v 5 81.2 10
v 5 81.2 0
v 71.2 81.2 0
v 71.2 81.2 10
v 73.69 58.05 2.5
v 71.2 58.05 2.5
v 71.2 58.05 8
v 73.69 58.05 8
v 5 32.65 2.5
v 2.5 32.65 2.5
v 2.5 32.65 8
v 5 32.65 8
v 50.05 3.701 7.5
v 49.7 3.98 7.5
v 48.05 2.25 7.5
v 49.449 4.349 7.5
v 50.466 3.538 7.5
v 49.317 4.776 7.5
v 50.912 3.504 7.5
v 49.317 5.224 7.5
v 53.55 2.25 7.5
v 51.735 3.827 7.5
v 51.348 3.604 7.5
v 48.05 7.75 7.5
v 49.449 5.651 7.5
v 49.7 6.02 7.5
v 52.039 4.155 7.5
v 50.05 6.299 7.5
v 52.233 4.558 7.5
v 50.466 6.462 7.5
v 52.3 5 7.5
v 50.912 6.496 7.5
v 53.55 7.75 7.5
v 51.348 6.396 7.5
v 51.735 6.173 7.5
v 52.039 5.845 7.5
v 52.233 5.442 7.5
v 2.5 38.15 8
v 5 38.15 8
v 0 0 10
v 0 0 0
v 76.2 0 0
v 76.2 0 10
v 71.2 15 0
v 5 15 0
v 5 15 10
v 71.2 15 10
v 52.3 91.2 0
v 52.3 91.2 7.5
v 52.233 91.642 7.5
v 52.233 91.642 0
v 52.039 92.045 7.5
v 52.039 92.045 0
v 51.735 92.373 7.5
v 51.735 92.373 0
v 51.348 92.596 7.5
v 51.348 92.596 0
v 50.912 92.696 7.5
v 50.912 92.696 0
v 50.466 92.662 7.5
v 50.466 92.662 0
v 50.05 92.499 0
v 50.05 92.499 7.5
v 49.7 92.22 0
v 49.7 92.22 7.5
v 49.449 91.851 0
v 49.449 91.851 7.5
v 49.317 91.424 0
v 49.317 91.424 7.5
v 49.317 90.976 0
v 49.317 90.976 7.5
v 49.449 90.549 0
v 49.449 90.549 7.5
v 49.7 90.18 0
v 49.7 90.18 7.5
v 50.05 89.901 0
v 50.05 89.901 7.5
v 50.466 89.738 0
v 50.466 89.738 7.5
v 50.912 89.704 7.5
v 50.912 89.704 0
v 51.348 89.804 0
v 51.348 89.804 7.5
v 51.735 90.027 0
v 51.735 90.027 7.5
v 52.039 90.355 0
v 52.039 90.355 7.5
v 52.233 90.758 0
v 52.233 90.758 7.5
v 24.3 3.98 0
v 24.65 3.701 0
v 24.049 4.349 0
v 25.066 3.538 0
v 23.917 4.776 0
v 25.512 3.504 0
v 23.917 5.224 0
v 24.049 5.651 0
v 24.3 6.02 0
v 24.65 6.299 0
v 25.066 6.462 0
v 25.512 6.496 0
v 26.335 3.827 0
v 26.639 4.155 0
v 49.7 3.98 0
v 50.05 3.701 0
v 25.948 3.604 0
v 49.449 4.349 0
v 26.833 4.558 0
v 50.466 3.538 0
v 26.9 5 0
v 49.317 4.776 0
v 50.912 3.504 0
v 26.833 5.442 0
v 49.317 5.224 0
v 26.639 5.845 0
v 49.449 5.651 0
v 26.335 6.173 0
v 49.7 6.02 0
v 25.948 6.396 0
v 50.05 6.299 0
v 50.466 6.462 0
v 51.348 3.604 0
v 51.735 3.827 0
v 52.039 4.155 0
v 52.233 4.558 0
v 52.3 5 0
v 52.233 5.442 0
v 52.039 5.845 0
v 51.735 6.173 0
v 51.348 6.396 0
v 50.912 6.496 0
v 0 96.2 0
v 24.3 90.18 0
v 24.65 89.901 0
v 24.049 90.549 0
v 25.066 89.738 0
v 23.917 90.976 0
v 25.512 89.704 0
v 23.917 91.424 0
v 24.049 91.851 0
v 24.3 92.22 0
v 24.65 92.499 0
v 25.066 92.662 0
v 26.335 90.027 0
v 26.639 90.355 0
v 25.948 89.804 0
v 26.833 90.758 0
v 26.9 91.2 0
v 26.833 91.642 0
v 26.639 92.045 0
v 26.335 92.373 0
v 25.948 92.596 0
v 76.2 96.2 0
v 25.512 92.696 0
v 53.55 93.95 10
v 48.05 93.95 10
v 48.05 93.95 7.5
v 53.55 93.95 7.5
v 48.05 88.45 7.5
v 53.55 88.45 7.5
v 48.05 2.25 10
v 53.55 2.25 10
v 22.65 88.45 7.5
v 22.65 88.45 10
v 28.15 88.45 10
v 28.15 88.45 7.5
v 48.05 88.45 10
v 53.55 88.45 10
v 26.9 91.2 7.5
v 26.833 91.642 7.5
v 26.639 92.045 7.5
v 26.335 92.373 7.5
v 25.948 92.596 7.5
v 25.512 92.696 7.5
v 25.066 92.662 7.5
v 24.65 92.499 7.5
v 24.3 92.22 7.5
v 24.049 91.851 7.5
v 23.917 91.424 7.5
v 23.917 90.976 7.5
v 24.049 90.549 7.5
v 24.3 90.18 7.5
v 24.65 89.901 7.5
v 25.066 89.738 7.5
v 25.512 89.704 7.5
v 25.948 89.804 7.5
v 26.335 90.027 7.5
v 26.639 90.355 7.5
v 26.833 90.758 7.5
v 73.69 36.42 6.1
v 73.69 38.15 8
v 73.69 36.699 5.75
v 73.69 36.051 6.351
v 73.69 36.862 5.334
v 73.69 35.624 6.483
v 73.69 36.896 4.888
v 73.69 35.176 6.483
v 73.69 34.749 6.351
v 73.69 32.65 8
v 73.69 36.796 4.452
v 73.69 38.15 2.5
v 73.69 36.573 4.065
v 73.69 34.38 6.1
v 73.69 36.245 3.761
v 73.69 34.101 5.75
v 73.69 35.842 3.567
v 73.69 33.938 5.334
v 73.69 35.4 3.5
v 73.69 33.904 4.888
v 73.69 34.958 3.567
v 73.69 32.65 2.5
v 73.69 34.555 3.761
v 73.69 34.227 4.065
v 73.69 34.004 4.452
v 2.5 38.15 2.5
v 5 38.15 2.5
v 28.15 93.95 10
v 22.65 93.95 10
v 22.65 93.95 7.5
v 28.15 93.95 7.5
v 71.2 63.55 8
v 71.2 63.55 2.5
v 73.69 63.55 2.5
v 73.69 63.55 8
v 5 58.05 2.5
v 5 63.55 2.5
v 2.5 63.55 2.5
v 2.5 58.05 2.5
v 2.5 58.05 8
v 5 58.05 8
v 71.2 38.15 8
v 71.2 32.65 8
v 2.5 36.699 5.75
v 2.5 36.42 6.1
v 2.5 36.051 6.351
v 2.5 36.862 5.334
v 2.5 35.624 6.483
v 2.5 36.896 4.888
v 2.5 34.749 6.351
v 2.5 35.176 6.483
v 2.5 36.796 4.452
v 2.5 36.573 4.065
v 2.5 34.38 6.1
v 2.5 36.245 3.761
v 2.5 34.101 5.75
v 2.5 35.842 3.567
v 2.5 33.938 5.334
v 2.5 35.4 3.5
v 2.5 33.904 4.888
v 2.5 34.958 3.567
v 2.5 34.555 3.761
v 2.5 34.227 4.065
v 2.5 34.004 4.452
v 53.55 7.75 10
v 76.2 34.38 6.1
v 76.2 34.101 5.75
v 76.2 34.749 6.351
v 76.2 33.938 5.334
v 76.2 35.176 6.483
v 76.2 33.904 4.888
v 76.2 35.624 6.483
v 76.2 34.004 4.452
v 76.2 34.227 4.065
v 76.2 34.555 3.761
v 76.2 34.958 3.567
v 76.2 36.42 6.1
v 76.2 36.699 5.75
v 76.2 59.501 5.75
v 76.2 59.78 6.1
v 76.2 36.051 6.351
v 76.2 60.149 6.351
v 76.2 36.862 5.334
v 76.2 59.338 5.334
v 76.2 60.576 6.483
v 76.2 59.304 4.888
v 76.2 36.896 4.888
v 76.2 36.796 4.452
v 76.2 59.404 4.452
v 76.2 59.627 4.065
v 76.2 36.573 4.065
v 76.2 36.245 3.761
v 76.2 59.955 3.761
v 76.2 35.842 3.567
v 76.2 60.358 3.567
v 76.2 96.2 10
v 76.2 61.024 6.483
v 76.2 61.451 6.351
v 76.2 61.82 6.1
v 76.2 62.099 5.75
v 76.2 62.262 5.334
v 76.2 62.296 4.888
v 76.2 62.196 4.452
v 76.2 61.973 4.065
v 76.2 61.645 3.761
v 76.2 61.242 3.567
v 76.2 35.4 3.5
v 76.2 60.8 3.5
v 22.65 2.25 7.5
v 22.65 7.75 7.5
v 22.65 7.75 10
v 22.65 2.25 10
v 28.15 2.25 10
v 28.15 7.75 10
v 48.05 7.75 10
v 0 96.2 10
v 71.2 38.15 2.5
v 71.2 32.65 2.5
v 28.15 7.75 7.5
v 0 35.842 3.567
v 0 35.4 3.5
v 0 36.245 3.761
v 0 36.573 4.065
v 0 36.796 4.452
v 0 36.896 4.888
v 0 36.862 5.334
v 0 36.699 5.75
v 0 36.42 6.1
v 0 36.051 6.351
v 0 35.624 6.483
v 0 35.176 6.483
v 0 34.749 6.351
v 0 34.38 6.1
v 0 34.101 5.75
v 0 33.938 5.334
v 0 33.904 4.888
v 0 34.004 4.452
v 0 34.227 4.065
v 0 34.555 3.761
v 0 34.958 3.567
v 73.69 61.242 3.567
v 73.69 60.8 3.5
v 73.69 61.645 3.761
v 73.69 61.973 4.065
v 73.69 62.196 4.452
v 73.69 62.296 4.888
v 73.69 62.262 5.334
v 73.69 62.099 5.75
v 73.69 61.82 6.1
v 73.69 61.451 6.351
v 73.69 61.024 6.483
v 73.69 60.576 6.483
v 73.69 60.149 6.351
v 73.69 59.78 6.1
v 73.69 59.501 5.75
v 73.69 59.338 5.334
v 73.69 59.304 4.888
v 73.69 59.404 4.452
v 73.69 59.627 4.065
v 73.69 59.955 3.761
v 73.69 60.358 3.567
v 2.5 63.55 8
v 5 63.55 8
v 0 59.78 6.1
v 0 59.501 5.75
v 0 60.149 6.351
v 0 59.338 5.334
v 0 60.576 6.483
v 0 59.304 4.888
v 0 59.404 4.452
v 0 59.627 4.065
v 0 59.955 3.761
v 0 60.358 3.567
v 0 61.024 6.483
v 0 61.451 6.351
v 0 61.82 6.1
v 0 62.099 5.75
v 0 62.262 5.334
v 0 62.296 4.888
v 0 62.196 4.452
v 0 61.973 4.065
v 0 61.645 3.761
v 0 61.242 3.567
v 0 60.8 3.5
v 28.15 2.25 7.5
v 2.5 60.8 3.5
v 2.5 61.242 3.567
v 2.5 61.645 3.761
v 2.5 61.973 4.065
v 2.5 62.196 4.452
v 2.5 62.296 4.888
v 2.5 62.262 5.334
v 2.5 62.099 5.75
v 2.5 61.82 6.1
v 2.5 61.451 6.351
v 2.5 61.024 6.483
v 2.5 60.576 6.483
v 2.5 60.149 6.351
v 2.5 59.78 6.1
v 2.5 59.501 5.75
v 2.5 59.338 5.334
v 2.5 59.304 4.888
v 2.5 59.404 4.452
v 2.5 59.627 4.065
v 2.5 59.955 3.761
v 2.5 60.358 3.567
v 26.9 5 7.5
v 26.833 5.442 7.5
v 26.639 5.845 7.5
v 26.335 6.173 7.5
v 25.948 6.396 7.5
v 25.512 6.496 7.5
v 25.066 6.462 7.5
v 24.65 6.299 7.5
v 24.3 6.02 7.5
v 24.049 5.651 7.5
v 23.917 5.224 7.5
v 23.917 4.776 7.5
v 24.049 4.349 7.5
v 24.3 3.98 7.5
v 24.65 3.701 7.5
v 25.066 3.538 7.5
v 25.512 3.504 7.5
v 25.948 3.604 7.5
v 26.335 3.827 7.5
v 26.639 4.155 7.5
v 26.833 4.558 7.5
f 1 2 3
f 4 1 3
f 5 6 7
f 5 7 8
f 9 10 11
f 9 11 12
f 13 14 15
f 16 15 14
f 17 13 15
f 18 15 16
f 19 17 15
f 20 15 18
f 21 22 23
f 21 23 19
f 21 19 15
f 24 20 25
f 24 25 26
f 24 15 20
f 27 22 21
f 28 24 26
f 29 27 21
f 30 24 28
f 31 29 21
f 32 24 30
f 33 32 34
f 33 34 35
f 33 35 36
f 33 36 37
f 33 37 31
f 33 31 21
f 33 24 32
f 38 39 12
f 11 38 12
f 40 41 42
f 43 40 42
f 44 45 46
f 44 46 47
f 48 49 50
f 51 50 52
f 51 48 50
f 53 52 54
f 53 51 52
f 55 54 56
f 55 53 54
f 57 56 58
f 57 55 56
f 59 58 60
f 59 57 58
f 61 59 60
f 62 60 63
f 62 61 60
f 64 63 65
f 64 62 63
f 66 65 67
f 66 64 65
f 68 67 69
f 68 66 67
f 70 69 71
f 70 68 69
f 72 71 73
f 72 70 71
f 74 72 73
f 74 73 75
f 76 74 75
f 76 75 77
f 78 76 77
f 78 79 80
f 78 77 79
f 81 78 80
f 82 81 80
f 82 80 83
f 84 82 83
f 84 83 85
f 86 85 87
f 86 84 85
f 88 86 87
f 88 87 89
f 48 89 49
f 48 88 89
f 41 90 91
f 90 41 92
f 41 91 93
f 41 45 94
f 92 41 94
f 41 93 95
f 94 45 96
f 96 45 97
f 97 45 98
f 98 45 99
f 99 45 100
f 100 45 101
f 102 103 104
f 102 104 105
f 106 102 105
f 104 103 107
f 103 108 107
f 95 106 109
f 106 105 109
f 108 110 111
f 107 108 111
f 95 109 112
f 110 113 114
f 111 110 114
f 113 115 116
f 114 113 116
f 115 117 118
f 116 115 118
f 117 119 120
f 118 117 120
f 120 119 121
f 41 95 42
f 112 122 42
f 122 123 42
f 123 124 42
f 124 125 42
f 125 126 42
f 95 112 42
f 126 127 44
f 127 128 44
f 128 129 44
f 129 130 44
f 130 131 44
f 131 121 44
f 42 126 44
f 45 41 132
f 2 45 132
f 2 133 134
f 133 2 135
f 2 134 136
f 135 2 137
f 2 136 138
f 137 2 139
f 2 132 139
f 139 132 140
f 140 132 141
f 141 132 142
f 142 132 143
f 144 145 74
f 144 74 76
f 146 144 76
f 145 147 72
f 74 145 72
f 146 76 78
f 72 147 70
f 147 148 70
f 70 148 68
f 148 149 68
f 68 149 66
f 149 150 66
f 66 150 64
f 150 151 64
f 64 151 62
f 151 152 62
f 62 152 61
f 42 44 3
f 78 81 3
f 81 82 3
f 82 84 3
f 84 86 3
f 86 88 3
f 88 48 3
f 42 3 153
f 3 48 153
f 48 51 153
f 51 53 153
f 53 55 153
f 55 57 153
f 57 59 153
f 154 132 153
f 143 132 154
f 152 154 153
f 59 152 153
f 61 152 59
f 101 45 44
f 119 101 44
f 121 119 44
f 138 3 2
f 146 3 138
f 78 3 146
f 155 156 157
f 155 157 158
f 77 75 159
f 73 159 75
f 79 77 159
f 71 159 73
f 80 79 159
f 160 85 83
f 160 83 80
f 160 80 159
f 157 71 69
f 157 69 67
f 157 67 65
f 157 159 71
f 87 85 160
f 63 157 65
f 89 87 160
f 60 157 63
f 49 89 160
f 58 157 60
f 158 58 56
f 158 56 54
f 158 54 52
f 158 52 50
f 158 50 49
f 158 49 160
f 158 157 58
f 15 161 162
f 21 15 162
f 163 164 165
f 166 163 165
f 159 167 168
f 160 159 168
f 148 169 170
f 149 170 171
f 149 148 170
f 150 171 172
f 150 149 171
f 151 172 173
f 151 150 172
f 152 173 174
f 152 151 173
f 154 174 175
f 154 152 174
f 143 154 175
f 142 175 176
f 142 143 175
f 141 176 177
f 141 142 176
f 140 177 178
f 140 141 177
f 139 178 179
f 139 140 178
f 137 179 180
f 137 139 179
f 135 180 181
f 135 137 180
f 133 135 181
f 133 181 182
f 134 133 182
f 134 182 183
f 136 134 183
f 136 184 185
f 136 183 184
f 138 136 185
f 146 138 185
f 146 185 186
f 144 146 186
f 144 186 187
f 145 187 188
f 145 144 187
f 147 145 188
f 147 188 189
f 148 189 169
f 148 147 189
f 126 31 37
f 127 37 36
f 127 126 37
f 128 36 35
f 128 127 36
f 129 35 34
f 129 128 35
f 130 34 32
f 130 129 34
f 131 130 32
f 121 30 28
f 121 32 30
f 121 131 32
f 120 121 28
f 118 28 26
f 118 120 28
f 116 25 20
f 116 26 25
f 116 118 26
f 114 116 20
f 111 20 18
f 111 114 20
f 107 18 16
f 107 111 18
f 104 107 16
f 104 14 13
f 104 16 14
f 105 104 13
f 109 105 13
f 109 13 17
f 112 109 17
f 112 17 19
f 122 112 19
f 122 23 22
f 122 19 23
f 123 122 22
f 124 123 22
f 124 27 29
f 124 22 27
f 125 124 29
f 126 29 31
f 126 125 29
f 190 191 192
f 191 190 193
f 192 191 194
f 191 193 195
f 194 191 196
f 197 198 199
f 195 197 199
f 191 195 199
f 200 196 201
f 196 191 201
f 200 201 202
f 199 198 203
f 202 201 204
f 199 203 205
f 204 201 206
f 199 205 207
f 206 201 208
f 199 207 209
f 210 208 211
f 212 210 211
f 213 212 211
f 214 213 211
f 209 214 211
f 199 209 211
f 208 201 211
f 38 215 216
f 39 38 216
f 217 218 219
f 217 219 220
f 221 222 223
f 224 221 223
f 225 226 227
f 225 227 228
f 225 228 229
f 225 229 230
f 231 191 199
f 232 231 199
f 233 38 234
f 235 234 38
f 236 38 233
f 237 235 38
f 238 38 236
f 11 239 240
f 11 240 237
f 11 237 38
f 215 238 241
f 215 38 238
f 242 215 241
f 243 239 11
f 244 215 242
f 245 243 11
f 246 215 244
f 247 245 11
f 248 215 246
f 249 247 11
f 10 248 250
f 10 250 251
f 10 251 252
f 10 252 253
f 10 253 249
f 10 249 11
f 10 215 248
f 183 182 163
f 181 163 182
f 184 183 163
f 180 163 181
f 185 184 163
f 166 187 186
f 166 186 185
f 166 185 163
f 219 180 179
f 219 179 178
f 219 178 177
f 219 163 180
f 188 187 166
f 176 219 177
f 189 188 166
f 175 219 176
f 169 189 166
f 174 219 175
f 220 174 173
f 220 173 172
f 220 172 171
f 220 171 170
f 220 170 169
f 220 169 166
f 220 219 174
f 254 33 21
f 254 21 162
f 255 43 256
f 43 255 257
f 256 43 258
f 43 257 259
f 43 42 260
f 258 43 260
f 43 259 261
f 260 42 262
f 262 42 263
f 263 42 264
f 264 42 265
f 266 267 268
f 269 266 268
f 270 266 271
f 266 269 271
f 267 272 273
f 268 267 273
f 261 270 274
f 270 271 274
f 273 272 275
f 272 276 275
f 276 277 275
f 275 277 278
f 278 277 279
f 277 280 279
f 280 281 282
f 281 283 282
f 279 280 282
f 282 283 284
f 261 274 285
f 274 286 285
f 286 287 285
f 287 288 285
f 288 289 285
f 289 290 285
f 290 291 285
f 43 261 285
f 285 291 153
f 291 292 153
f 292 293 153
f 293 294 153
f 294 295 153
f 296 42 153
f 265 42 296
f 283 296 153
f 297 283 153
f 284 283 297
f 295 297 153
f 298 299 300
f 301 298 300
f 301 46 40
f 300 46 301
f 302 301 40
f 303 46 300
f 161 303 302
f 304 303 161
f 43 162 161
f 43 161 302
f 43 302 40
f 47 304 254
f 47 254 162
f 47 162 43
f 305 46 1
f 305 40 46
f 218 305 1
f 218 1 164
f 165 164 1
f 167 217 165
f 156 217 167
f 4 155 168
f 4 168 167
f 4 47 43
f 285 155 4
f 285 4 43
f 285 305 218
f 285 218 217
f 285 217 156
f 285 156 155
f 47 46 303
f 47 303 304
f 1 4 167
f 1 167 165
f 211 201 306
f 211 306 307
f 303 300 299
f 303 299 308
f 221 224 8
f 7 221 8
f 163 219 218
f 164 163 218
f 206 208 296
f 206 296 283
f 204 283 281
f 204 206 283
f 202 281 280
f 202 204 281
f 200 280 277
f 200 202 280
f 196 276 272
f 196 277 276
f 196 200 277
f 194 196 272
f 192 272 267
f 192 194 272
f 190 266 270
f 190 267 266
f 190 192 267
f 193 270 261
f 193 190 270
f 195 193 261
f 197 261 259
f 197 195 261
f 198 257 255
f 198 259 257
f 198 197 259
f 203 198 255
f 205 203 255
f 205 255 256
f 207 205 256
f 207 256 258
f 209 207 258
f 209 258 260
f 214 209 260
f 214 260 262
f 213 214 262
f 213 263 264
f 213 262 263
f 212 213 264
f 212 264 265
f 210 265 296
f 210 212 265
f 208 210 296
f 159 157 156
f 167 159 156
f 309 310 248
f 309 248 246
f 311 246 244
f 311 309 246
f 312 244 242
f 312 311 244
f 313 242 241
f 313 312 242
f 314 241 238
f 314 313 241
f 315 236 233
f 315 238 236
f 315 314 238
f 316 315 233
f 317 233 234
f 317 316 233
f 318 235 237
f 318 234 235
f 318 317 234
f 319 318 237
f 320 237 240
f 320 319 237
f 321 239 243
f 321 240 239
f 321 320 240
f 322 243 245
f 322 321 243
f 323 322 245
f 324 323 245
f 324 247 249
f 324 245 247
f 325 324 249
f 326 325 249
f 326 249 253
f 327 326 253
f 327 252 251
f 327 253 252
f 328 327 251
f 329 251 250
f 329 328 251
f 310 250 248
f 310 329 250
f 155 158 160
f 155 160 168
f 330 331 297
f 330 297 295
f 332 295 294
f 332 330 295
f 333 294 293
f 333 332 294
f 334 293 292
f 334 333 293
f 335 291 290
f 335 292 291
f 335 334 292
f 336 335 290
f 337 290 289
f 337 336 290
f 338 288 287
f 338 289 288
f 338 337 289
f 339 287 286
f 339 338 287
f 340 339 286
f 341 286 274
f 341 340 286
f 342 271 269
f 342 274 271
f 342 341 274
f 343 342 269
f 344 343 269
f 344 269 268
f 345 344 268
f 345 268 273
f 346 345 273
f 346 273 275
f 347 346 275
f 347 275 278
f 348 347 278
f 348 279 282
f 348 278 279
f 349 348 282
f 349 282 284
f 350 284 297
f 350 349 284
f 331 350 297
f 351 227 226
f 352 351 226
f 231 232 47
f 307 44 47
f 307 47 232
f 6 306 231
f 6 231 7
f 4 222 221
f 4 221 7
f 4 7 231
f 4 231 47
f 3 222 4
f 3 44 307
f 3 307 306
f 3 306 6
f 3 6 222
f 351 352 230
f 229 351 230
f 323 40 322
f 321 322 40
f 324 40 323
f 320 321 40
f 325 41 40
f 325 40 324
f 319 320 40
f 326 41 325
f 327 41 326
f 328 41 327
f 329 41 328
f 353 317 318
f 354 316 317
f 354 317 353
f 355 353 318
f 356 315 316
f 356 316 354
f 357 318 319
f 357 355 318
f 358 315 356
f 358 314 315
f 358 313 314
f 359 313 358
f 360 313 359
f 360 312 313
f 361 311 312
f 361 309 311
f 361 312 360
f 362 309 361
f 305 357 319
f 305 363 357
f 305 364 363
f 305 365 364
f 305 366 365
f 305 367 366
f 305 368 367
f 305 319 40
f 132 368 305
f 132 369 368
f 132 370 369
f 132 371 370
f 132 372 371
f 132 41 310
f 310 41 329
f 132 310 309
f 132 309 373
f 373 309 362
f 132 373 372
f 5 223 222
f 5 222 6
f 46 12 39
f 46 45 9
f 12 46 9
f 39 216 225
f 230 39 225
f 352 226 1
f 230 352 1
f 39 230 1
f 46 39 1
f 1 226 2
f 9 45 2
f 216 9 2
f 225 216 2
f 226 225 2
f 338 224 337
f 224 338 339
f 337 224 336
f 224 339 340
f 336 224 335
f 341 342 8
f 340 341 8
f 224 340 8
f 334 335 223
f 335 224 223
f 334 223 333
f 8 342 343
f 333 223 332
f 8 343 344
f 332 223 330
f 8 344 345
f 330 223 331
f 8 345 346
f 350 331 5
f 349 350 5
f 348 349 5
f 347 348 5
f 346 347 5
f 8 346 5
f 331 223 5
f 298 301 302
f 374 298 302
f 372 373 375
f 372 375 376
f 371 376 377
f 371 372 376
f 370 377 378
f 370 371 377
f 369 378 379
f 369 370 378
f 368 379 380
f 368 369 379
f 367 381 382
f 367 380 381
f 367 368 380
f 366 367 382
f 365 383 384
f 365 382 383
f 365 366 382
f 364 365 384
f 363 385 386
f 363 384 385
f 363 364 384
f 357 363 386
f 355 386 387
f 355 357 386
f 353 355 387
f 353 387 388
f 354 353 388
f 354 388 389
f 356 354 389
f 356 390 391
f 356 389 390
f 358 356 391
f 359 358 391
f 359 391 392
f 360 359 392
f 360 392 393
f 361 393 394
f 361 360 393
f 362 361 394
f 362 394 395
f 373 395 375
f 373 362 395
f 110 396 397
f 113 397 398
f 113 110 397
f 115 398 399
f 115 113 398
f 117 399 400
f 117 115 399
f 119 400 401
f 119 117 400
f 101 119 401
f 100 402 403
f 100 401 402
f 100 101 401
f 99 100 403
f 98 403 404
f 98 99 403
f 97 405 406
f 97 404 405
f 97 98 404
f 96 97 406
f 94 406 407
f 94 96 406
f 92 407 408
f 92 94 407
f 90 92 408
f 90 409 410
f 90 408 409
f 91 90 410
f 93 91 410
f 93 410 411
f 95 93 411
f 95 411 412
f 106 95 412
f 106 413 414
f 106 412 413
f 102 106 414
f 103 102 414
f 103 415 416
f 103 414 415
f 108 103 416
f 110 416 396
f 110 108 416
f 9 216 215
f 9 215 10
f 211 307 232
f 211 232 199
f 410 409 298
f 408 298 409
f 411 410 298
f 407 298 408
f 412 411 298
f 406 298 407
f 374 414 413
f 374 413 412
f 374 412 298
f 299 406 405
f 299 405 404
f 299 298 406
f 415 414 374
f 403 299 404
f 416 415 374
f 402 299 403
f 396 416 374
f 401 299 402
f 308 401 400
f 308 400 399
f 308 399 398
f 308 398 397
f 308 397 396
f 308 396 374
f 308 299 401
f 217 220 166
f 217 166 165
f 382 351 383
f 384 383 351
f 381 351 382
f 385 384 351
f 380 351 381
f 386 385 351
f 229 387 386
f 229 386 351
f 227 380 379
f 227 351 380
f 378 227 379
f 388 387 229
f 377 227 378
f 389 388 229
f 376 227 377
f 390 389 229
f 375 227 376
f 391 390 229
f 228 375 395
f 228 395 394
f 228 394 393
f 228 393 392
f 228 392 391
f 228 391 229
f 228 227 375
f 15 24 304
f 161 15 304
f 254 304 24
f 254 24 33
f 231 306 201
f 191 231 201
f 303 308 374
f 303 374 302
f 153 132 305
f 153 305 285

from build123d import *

# Parameters (mm, degrees)
CYLINDER002001_R              = 1.5
CYLINDER002001_DEPTH          = 5
CYLINDER002001_PITCH_ANGLE    = 90
CYLINDER002002_R              = 1.5
CYLINDER002002_DEPTH          = 5
CYLINDER002002_PITCH_ANGLE    = 90
CYLINDER002001001_R           = 1.5
CYLINDER002001001_DEPTH       = 5
CYLINDER002001001_PITCH_ANGLE = 90
CYLINDER_R                    = 1.5
CYLINDER_DEPTH                = 10
CYLINDER002001002_R           = 1.5
CYLINDER002001002_DEPTH       = 10
CYLINDER002001003_R           = 1.5
CYLINDER002001003_DEPTH       = 10
CYLINDER002001002001_R        = 1.5
CYLINDER002001002001_DEPTH    = 10
CYLINDER002_R                 = 1.5
CYLINDER002_DEPTH             = 5
CYLINDER002_PITCH_ANGLE       = 90
BOX003_W                      = 5.5
BOX003_H                      = 2.5
BOX003_DEPTH                  = 5.5
BOX003_PLACEMENT_ANGLE        = -90
BOX004_W                      = 5.5
BOX004_H                      = 2.5
BOX004_DEPTH                  = 5.5
BOX004_PLACEMENT_ANGLE        = -90
BOX005_W                      = 5.5
BOX005_H                      = 2.5
BOX005_DEPTH                  = 5.5
BOX005_PLACEMENT_ANGLE        = -90
BOX006_W                      = 5.5
BOX006_H                      = 2.5
BOX006_DEPTH                  = 5.5
BOX006_ROLL_ANGLE             = 90
BOX007_W                      = 5.5
BOX007_H                      = 2.5
BOX007_DEPTH                  = 5.5
BOX007_ROLL_ANGLE             = 90
BOX006001_W                   = 5.5
BOX006001_H                   = 2.5
BOX006001_DEPTH               = 5.5
BOX006001_ROLL_ANGLE          = 90
BOX007001_W                   = 5.5
BOX007001_H                   = 2.5
BOX007001_DEPTH               = 5.5
BOX007001_ROLL_ANGLE          = 90
BOX002_W                      = 5.5
BOX002_H                      = 2.5
BOX002_DEPTH                  = 5.5
BOX002_PLACEMENT_ANGLE        = -90
BOX001_W                      = 66.199997
BOX001_H                      = 66.199997
BOX001_DEPTH                  = 10
BOX_W                         = 76.199997
BOX_H                         = 96.199997
BOX_DEPTH                     = 10


with BuildPart() as cylinder002001:
    # Cylinder002001 → Cylinder002001 (new body)
    with BuildSketch(Plane.XY):
        Circle(CYLINDER002001_R)
    extrude(amount=CYLINDER002001_DEPTH)


with BuildPart() as cylinder002001_1:
    # Cylinder002001 pitch: moved
    add(cylinder002001.part.rotate(Axis((0, 0, 0), (0, 1, 0)), CYLINDER002001_PITCH_ANGLE))


with BuildPart() as cylinder002001_2:
    # Cylinder002001 placement: moved
    add(cylinder002001_1.part.moved(Location((71.2, 35.4, 5))))


with BuildPart() as cylinder002002:
    # Cylinder002002 → Cylinder002002 (new body)
    with BuildSketch(Plane.XY):
        Circle(CYLINDER002002_R)
    extrude(amount=CYLINDER002002_DEPTH)


with BuildPart() as cylinder002002_1:
    # Cylinder002002 pitch: moved
    add(cylinder002002.part.rotate(Axis((0, 0, 0), (0, 1, 0)), CYLINDER002002_PITCH_ANGLE))


with BuildPart() as cylinder002002_2:
    # Cylinder002002 placement: moved
    add(cylinder002002_1.part.moved(Location((-0.8, 60.8, 5))))


with BuildPart() as cylinder002001001:
    # Cylinder002001001 → Cylinder002001001 (new body)
    with BuildSketch(Plane.XY):
        Circle(CYLINDER002001001_R)
    extrude(amount=CYLINDER002001001_DEPTH)


with BuildPart() as cylinder002001001_1:
    # Cylinder002001001 pitch: moved
    add(cylinder002001001.part.rotate(Axis((0, 0, 0), (0, 1, 0)), CYLINDER002001001_PITCH_ANGLE))


with BuildPart() as cylinder002001001_2:
    # Cylinder002001001 placement: moved
    add(cylinder002001001_1.part.moved(Location((-0.8, 35.4, 5))))


with BuildPart() as cylinder:
    # Cylinder → Cylinder (new body)
    with BuildSketch(Plane(origin=(25.4, 5, 0), x_dir=(1, 0, 0), z_dir=(0, 0, 1))):
        Circle(CYLINDER_R)
    extrude(amount=CYLINDER_DEPTH)


with BuildPart() as cylinder002001002:
    # Cylinder002001002 → Cylinder002001002 (new body)
    with BuildSketch(Plane(origin=(50.8, 5, 0), x_dir=(1, 0, 0), z_dir=(0, 0, 1))):
        Circle(CYLINDER002001002_R)
    extrude(amount=CYLINDER002001002_DEPTH)


with BuildPart() as cylinder002001003:
    # Cylinder002001003 → Cylinder002001003 (new body)
    with BuildSketch(Plane(origin=(25.4, 91.2, 0), x_dir=(1, 0, 0), z_dir=(0, 0, 1))):
        Circle(CYLINDER002001003_R)
    extrude(amount=CYLINDER002001003_DEPTH)


with BuildPart() as cylinder002001002001:
    # Cylinder002001002001 → Cylinder002001002001 (new body)
    with BuildSketch(Plane(origin=(50.8, 91.2, 0), x_dir=(1, 0, 0), z_dir=(0, 0, 1))):
        Circle(CYLINDER002001002001_R)
    extrude(amount=CYLINDER002001002001_DEPTH)


with BuildPart() as cylinder002:
    # Cylinder002 → Cylinder002 (new body)
    with BuildSketch(Plane.XY):
        Circle(CYLINDER002_R)
    extrude(amount=CYLINDER002_DEPTH)


with BuildPart() as cylinder002_1:
    # Cylinder002 pitch: moved
    add(cylinder002.part.rotate(Axis((0, 0, 0), (0, 1, 0)), CYLINDER002_PITCH_ANGLE))


with BuildPart() as cylinder002_2:
    # Cylinder002 placement: moved
    add(cylinder002_1.part.moved(Location((71.2, 60.8, 5))))


with BuildPart() as box003:
    # Box003 → Box003 (new body)
    with BuildSketch(Plane.XY):
        with Locations((2.75, 1.25)):
            Rectangle(BOX003_W, BOX003_H)
    extrude(amount=BOX003_DEPTH)


with BuildPart() as box003_1:
    # Box003 placement: moved
    add(box003.part.moved(Location((71.19, 63.55, 2.5))).rotate(Axis((71.19, 63.55, 2.5), (0, 0, 1)), BOX003_PLACEMENT_ANGLE))


with BuildPart() as box004:
    # Box004 → Box004 (new body)
    with BuildSketch(Plane.XY):
        with Locations((2.75, 1.25)):
            Rectangle(BOX004_W, BOX004_H)
    extrude(amount=BOX004_DEPTH)


with BuildPart() as box004_1:
    # Box004 placement: moved
    add(box004.part.moved(Location((2.5, 63.55, 2.5))).rotate(Axis((2.5, 63.55, 2.5), (0, 0, 1)), BOX004_PLACEMENT_ANGLE))


with BuildPart() as box005:
    # Box005 → Box005 (new body)
    with BuildSketch(Plane.XY):
        with Locations((2.75, 1.25)):
            Rectangle(BOX005_W, BOX005_H)
    extrude(amount=BOX005_DEPTH)


with BuildPart() as box005_1:
    # Box005 placement: moved
    add(box005.part.moved(Location((2.5, 38.15, 2.5))).rotate(Axis((2.5, 38.15, 2.5), (0, 0, 1)), BOX005_PLACEMENT_ANGLE))


with BuildPart() as box006:
    # Box006 → Box006 (new body)
    with BuildSketch(Plane.XY):
        with Locations((2.75, 1.25)):
            Rectangle(BOX006_W, BOX006_H)
    extrude(amount=BOX006_DEPTH)


with BuildPart() as box006_1:
    # Box006 roll: moved
    add(box006.part.rotate(Axis((0, 0, 0), (1, 0, 0)), BOX006_ROLL_ANGLE))


with BuildPart() as box006_2:
    # Box006 placement: moved
    add(box006_1.part.moved(Location((22.65, 7.75, 7.5))))


with BuildPart() as box007:
    # Box007 → Box007 (new body)
    with BuildSketch(Plane.XY):
        with Locations((2.75, 1.25)):
            Rectangle(BOX007_W, BOX007_H)
    extrude(amount=BOX007_DEPTH)


with BuildPart() as box007_1:
    # Box007 roll: moved
    add(box007.part.rotate(Axis((0, 0, 0), (1, 0, 0)), BOX007_ROLL_ANGLE))


with BuildPart() as box007_2:
    # Box007 placement: moved
    add(box007_1.part.moved(Location((48.05, 7.75, 7.5))))


with BuildPart() as box006001:
    # Box006001 → Box006001 (new body)
    with BuildSketch(Plane.XY):
        with Locations((2.75, 1.25)):
            Rectangle(BOX006001_W, BOX006001_H)
    extrude(amount=BOX006001_DEPTH)


with BuildPart() as box006001_1:
    # Box006001 roll: moved
    add(box006001.part.rotate(Axis((0, 0, 0), (1, 0, 0)), BOX006001_ROLL_ANGLE))


with BuildPart() as box006001_2:
    # Box006001 placement: moved
    add(box006001_1.part.moved(Location((22.65, 93.95, 7.5))))


with BuildPart() as box007001:
    # Box007001 → Box007001 (new body)
    with BuildSketch(Plane.XY):
        with Locations((2.75, 1.25)):
            Rectangle(BOX007001_W, BOX007001_H)
    extrude(amount=BOX007001_DEPTH)


with BuildPart() as box007001_1:
    # Box007001 roll: moved
    add(box007001.part.rotate(Axis((0, 0, 0), (1, 0, 0)), BOX007001_ROLL_ANGLE))


with BuildPart() as box007001_2:
    # Box007001 placement: moved
    add(box007001_1.part.moved(Location((48.05, 93.95, 7.5))))


with BuildPart() as box002:
    # Box002 → Box002 (new body)
    with BuildSketch(Plane.XY):
        with Locations((2.75, 1.25)):
            Rectangle(BOX002_W, BOX002_H)
    extrude(amount=BOX002_DEPTH)


with BuildPart() as box002_1:
    # Box002 placement: moved
    add(box002.part.moved(Location((71.19, 38.15, 2.5))).rotate(Axis((71.19, 38.15, 2.5), (0, 0, 1)), BOX002_PLACEMENT_ANGLE))


with BuildPart() as box001:
    # Box001 → Box001 (new body)
    with BuildSketch(Plane(origin=(5, 15, 0), x_dir=(1, 0, 0), z_dir=(0, 0, 1))):
        with Locations((33.099998, 33.099998)):
            Rectangle(BOX001_W, BOX001_H)
    extrude(amount=BOX001_DEPTH)


with BuildPart() as cut016:
    # Box → Box (new body)
    with BuildSketch(Plane.XY):
        with Locations((38.099998, 48.099998)):
            Rectangle(BOX_W, BOX_H)
    extrude(amount=BOX_DEPTH)

    # Cut: cut Box001
    add(box001.part, mode=Mode.SUBTRACT)

    # Cut001: cut Box002
    add(box002_1.part, mode=Mode.SUBTRACT)

    # Cut002: cut Box007001
    add(box007001_2.part, mode=Mode.SUBTRACT)

    # Cut003: cut Box006001
    add(box006001_2.part, mode=Mode.SUBTRACT)

    # Cut004: cut Box007
    add(box007_2.part, mode=Mode.SUBTRACT)

    # Cut005: cut Box006
    add(box006_2.part, mode=Mode.SUBTRACT)

    # Cut006: cut Box005
    add(box005_1.part, mode=Mode.SUBTRACT)

    # Cut007: cut Box004
    add(box004_1.part, mode=Mode.SUBTRACT)

    # Cut008: cut Box003
    add(box003_1.part, mode=Mode.SUBTRACT)

    # Cut009: cut Cylinder002
    add(cylinder002_2.part, mode=Mode.SUBTRACT)

    # Cut010: cut Cylinder002001002001
    add(cylinder002001002001.part, mode=Mode.SUBTRACT)

    # Cut011: cut Cylinder002001003
    add(cylinder002001003.part, mode=Mode.SUBTRACT)

    # Cut012: cut Cylinder002001002
    add(cylinder002001002.part, mode=Mode.SUBTRACT)

    # Cut013: cut Cylinder
    add(cylinder.part, mode=Mode.SUBTRACT)

    # Cut014: cut Cylinder002001001
    add(cylinder002001001_2.part, mode=Mode.SUBTRACT)

    # Cut015: cut Cylinder002002
    add(cylinder002002_2.part, mode=Mode.SUBTRACT)

    # Cut016: cut Cylinder002001
    add(cylinder002001_2.part, mode=Mode.SUBTRACT)


solid = cut016.part
